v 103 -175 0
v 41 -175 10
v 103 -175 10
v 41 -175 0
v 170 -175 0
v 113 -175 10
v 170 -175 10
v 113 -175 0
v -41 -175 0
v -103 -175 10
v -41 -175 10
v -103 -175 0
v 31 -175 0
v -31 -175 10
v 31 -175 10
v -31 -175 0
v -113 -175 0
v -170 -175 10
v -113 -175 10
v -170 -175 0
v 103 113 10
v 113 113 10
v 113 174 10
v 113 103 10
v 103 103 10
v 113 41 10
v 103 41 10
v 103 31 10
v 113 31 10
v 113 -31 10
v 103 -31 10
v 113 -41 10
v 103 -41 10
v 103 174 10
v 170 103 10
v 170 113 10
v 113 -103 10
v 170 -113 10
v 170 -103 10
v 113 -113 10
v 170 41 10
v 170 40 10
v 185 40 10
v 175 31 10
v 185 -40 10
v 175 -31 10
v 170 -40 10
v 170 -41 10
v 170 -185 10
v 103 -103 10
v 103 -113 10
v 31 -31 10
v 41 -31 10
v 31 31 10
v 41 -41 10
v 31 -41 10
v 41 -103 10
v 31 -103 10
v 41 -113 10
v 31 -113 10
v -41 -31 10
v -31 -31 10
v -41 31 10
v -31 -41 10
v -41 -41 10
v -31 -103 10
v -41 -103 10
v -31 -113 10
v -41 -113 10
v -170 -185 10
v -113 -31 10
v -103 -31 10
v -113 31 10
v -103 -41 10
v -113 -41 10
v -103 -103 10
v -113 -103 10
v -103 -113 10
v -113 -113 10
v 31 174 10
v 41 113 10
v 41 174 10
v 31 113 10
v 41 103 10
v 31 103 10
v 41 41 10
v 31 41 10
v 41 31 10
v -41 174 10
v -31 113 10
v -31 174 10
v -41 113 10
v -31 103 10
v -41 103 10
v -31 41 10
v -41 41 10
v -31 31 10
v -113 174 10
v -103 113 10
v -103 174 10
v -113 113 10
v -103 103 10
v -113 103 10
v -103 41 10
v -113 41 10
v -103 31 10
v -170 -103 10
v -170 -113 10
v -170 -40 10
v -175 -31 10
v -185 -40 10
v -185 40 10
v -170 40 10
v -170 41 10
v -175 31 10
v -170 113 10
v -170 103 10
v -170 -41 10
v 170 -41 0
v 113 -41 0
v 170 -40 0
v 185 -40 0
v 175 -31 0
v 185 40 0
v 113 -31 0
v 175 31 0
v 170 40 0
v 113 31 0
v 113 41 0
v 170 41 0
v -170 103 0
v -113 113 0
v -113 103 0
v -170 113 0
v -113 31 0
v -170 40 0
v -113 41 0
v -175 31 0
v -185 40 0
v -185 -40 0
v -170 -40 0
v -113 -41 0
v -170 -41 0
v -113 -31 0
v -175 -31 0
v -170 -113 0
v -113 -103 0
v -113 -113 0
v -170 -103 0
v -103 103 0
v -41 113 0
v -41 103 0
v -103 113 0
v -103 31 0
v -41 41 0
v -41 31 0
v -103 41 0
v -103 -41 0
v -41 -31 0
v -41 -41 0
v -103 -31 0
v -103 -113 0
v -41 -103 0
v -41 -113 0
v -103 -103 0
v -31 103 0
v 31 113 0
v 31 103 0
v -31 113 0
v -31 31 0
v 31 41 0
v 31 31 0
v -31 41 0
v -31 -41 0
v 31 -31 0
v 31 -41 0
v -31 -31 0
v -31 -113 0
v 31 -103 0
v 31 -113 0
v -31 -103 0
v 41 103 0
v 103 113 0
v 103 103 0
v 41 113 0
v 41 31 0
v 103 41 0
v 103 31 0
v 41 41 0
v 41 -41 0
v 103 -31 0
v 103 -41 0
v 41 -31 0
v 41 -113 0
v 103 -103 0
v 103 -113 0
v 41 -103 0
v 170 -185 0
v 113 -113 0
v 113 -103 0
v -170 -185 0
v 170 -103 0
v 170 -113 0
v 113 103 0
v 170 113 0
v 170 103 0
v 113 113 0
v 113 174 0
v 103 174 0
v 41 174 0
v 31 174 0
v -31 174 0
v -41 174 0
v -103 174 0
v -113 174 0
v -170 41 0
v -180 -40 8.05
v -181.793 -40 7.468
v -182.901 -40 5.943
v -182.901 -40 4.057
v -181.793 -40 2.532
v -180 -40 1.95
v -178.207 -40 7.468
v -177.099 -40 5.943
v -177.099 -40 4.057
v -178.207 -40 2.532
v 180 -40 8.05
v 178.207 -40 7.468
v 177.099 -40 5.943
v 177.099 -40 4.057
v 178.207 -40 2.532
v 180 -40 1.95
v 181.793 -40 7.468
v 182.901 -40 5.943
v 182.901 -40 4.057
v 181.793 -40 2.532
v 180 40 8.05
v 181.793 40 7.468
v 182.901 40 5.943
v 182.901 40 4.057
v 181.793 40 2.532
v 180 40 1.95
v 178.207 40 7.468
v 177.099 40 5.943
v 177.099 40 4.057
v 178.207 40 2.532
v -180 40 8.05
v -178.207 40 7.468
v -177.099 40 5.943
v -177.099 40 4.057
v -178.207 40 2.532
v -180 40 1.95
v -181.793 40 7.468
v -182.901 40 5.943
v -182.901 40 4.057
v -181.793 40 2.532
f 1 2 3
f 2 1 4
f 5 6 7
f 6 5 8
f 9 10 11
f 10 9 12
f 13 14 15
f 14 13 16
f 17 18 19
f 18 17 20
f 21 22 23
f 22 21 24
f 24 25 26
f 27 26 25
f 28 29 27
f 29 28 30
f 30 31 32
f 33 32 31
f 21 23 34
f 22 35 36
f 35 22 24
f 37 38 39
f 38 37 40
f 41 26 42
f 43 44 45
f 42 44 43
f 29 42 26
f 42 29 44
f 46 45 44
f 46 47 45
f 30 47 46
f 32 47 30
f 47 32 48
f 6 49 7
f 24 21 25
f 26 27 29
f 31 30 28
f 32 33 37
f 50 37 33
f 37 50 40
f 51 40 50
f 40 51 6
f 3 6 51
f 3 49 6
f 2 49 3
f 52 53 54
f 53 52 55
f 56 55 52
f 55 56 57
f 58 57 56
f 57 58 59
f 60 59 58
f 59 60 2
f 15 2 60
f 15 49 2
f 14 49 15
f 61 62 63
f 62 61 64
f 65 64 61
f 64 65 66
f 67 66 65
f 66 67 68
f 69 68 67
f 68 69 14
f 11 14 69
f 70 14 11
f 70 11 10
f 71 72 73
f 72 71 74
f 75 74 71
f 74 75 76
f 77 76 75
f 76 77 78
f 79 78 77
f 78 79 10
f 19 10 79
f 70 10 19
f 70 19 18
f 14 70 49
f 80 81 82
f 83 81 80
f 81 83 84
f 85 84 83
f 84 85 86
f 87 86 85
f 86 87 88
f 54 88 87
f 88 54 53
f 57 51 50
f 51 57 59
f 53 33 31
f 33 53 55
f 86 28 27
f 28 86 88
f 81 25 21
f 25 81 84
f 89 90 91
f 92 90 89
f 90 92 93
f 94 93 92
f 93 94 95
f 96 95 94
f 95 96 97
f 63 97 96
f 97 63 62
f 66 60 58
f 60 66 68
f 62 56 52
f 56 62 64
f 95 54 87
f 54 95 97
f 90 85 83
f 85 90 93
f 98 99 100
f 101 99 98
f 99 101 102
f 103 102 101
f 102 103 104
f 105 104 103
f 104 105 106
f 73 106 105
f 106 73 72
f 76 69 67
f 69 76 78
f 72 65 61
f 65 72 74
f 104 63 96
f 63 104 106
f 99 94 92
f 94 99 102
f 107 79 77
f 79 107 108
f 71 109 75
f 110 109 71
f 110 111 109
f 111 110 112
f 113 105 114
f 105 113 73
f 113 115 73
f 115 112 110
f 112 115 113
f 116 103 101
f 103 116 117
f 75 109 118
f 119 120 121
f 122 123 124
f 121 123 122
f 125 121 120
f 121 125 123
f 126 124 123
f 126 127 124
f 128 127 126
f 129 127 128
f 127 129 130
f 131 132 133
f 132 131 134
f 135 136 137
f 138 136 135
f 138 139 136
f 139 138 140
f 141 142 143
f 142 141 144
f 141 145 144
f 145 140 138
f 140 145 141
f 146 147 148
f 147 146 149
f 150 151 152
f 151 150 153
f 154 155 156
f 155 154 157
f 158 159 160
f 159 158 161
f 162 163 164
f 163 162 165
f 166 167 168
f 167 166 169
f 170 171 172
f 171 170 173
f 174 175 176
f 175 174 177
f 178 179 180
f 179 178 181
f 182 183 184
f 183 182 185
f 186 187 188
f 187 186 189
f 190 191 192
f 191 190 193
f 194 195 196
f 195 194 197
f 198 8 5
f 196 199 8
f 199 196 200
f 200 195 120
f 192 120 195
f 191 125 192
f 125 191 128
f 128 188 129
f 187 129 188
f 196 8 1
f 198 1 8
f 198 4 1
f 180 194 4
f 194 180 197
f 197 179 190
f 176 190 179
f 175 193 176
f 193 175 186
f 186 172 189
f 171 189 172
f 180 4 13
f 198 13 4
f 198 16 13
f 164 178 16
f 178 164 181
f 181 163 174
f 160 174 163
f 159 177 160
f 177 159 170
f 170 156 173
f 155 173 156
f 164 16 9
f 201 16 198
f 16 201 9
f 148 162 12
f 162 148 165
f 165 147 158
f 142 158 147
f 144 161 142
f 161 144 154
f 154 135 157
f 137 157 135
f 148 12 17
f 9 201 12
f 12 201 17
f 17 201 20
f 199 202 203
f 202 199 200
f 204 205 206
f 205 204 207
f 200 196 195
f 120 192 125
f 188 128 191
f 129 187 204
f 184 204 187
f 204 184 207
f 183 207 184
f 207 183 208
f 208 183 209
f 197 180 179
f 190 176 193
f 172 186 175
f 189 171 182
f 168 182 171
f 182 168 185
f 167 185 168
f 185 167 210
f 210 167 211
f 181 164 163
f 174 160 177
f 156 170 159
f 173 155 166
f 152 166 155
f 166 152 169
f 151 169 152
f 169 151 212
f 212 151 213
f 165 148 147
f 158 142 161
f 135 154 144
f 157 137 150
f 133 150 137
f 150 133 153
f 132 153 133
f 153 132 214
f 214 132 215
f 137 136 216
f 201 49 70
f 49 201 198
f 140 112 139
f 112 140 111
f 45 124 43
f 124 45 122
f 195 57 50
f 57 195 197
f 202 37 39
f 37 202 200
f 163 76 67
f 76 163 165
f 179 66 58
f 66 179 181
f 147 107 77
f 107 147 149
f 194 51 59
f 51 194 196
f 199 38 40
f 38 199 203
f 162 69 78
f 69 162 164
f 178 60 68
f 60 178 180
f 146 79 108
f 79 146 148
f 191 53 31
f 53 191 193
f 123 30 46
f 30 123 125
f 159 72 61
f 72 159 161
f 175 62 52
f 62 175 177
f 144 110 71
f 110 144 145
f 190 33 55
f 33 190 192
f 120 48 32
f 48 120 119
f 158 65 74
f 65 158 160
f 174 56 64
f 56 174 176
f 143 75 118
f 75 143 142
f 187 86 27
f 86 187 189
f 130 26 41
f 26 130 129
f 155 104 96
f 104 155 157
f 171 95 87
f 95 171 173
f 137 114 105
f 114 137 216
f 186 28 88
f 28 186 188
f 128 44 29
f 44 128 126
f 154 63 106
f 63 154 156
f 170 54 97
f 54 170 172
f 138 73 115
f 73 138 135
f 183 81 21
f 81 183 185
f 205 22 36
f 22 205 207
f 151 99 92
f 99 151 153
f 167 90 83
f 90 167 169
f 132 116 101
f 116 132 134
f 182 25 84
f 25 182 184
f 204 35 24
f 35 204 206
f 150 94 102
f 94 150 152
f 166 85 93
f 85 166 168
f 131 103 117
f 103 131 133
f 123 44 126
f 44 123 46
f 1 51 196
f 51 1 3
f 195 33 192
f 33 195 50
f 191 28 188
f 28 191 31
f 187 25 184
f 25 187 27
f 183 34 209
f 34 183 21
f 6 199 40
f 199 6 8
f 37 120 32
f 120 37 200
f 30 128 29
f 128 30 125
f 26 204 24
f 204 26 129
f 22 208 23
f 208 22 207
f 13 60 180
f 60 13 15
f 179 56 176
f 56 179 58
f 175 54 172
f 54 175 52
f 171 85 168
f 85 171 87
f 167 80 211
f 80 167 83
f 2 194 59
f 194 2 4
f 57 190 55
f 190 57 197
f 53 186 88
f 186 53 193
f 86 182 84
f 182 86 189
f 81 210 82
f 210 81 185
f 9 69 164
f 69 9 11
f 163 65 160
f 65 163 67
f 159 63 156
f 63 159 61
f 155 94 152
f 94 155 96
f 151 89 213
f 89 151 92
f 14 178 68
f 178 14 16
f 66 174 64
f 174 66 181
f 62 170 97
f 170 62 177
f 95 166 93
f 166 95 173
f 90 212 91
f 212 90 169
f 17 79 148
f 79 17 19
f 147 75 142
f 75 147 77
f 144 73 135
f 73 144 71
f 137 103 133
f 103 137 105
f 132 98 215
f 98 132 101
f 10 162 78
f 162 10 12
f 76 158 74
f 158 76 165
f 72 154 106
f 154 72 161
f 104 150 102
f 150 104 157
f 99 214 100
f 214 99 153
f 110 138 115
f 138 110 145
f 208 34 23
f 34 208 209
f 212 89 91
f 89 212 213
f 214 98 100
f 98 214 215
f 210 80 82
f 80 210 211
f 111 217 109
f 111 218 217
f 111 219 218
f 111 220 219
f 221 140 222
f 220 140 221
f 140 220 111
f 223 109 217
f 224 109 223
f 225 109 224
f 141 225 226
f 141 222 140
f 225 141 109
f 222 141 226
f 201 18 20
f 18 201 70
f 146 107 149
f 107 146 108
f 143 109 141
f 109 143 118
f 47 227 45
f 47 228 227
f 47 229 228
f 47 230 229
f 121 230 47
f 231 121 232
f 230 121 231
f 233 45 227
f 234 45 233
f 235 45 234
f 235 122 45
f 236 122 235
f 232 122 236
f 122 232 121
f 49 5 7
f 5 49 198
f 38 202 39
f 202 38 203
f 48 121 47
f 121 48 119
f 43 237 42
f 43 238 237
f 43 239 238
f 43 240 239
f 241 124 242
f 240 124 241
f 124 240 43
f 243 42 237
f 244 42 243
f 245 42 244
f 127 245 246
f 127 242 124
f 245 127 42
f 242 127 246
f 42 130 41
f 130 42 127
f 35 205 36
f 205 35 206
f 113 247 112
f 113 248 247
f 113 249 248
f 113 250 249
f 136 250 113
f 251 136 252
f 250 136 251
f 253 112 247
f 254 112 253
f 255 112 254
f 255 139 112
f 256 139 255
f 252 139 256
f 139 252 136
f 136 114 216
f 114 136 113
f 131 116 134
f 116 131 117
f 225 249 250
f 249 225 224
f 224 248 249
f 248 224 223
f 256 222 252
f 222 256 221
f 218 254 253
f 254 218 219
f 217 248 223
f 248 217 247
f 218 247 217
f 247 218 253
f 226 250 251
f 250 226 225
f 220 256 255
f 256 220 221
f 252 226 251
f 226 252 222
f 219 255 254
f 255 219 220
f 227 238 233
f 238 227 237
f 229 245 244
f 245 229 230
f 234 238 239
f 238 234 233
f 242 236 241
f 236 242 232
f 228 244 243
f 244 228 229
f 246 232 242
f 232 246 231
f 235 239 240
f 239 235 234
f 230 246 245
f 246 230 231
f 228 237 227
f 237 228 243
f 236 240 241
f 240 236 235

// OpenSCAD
rotate([0, 0, 90]) translate([0, 0, 5]) difference()
{
  union()
  {
    for(x = [-370 / 2 + 5:72:220])
    {
      translate([x, 0, 0]) cube([10, 370, 10], center = true);
    }

    for(y = [-370 / 2 + 5:72:220])
    {
      translate([0, y, 0]) cube([370, 10, 10], center = true);
    }
  }

  translate([364, 0, 0]) cube([380, 380, 20], center = true);

  translate([-140, 220, 0]) cube([200, 100, 20], center = true);
  translate([-140, -220, 0]) cube([200, 100, 20], center = true);
  translate([140, -220, 0]) cube([200, 100, 20], center = true);
  translate([140, 220, 0]) cube([200, 100, 20], center = true);

  translate([0, 180, 0]) rotate([0, 90, 0]) cylinder(h = 1000, d = 6.1, center = true);
  translate([0, -180, 0]) rotate([0, 90, 0]) cylinder(h = 1000, d = 6.1, center = true);
}
